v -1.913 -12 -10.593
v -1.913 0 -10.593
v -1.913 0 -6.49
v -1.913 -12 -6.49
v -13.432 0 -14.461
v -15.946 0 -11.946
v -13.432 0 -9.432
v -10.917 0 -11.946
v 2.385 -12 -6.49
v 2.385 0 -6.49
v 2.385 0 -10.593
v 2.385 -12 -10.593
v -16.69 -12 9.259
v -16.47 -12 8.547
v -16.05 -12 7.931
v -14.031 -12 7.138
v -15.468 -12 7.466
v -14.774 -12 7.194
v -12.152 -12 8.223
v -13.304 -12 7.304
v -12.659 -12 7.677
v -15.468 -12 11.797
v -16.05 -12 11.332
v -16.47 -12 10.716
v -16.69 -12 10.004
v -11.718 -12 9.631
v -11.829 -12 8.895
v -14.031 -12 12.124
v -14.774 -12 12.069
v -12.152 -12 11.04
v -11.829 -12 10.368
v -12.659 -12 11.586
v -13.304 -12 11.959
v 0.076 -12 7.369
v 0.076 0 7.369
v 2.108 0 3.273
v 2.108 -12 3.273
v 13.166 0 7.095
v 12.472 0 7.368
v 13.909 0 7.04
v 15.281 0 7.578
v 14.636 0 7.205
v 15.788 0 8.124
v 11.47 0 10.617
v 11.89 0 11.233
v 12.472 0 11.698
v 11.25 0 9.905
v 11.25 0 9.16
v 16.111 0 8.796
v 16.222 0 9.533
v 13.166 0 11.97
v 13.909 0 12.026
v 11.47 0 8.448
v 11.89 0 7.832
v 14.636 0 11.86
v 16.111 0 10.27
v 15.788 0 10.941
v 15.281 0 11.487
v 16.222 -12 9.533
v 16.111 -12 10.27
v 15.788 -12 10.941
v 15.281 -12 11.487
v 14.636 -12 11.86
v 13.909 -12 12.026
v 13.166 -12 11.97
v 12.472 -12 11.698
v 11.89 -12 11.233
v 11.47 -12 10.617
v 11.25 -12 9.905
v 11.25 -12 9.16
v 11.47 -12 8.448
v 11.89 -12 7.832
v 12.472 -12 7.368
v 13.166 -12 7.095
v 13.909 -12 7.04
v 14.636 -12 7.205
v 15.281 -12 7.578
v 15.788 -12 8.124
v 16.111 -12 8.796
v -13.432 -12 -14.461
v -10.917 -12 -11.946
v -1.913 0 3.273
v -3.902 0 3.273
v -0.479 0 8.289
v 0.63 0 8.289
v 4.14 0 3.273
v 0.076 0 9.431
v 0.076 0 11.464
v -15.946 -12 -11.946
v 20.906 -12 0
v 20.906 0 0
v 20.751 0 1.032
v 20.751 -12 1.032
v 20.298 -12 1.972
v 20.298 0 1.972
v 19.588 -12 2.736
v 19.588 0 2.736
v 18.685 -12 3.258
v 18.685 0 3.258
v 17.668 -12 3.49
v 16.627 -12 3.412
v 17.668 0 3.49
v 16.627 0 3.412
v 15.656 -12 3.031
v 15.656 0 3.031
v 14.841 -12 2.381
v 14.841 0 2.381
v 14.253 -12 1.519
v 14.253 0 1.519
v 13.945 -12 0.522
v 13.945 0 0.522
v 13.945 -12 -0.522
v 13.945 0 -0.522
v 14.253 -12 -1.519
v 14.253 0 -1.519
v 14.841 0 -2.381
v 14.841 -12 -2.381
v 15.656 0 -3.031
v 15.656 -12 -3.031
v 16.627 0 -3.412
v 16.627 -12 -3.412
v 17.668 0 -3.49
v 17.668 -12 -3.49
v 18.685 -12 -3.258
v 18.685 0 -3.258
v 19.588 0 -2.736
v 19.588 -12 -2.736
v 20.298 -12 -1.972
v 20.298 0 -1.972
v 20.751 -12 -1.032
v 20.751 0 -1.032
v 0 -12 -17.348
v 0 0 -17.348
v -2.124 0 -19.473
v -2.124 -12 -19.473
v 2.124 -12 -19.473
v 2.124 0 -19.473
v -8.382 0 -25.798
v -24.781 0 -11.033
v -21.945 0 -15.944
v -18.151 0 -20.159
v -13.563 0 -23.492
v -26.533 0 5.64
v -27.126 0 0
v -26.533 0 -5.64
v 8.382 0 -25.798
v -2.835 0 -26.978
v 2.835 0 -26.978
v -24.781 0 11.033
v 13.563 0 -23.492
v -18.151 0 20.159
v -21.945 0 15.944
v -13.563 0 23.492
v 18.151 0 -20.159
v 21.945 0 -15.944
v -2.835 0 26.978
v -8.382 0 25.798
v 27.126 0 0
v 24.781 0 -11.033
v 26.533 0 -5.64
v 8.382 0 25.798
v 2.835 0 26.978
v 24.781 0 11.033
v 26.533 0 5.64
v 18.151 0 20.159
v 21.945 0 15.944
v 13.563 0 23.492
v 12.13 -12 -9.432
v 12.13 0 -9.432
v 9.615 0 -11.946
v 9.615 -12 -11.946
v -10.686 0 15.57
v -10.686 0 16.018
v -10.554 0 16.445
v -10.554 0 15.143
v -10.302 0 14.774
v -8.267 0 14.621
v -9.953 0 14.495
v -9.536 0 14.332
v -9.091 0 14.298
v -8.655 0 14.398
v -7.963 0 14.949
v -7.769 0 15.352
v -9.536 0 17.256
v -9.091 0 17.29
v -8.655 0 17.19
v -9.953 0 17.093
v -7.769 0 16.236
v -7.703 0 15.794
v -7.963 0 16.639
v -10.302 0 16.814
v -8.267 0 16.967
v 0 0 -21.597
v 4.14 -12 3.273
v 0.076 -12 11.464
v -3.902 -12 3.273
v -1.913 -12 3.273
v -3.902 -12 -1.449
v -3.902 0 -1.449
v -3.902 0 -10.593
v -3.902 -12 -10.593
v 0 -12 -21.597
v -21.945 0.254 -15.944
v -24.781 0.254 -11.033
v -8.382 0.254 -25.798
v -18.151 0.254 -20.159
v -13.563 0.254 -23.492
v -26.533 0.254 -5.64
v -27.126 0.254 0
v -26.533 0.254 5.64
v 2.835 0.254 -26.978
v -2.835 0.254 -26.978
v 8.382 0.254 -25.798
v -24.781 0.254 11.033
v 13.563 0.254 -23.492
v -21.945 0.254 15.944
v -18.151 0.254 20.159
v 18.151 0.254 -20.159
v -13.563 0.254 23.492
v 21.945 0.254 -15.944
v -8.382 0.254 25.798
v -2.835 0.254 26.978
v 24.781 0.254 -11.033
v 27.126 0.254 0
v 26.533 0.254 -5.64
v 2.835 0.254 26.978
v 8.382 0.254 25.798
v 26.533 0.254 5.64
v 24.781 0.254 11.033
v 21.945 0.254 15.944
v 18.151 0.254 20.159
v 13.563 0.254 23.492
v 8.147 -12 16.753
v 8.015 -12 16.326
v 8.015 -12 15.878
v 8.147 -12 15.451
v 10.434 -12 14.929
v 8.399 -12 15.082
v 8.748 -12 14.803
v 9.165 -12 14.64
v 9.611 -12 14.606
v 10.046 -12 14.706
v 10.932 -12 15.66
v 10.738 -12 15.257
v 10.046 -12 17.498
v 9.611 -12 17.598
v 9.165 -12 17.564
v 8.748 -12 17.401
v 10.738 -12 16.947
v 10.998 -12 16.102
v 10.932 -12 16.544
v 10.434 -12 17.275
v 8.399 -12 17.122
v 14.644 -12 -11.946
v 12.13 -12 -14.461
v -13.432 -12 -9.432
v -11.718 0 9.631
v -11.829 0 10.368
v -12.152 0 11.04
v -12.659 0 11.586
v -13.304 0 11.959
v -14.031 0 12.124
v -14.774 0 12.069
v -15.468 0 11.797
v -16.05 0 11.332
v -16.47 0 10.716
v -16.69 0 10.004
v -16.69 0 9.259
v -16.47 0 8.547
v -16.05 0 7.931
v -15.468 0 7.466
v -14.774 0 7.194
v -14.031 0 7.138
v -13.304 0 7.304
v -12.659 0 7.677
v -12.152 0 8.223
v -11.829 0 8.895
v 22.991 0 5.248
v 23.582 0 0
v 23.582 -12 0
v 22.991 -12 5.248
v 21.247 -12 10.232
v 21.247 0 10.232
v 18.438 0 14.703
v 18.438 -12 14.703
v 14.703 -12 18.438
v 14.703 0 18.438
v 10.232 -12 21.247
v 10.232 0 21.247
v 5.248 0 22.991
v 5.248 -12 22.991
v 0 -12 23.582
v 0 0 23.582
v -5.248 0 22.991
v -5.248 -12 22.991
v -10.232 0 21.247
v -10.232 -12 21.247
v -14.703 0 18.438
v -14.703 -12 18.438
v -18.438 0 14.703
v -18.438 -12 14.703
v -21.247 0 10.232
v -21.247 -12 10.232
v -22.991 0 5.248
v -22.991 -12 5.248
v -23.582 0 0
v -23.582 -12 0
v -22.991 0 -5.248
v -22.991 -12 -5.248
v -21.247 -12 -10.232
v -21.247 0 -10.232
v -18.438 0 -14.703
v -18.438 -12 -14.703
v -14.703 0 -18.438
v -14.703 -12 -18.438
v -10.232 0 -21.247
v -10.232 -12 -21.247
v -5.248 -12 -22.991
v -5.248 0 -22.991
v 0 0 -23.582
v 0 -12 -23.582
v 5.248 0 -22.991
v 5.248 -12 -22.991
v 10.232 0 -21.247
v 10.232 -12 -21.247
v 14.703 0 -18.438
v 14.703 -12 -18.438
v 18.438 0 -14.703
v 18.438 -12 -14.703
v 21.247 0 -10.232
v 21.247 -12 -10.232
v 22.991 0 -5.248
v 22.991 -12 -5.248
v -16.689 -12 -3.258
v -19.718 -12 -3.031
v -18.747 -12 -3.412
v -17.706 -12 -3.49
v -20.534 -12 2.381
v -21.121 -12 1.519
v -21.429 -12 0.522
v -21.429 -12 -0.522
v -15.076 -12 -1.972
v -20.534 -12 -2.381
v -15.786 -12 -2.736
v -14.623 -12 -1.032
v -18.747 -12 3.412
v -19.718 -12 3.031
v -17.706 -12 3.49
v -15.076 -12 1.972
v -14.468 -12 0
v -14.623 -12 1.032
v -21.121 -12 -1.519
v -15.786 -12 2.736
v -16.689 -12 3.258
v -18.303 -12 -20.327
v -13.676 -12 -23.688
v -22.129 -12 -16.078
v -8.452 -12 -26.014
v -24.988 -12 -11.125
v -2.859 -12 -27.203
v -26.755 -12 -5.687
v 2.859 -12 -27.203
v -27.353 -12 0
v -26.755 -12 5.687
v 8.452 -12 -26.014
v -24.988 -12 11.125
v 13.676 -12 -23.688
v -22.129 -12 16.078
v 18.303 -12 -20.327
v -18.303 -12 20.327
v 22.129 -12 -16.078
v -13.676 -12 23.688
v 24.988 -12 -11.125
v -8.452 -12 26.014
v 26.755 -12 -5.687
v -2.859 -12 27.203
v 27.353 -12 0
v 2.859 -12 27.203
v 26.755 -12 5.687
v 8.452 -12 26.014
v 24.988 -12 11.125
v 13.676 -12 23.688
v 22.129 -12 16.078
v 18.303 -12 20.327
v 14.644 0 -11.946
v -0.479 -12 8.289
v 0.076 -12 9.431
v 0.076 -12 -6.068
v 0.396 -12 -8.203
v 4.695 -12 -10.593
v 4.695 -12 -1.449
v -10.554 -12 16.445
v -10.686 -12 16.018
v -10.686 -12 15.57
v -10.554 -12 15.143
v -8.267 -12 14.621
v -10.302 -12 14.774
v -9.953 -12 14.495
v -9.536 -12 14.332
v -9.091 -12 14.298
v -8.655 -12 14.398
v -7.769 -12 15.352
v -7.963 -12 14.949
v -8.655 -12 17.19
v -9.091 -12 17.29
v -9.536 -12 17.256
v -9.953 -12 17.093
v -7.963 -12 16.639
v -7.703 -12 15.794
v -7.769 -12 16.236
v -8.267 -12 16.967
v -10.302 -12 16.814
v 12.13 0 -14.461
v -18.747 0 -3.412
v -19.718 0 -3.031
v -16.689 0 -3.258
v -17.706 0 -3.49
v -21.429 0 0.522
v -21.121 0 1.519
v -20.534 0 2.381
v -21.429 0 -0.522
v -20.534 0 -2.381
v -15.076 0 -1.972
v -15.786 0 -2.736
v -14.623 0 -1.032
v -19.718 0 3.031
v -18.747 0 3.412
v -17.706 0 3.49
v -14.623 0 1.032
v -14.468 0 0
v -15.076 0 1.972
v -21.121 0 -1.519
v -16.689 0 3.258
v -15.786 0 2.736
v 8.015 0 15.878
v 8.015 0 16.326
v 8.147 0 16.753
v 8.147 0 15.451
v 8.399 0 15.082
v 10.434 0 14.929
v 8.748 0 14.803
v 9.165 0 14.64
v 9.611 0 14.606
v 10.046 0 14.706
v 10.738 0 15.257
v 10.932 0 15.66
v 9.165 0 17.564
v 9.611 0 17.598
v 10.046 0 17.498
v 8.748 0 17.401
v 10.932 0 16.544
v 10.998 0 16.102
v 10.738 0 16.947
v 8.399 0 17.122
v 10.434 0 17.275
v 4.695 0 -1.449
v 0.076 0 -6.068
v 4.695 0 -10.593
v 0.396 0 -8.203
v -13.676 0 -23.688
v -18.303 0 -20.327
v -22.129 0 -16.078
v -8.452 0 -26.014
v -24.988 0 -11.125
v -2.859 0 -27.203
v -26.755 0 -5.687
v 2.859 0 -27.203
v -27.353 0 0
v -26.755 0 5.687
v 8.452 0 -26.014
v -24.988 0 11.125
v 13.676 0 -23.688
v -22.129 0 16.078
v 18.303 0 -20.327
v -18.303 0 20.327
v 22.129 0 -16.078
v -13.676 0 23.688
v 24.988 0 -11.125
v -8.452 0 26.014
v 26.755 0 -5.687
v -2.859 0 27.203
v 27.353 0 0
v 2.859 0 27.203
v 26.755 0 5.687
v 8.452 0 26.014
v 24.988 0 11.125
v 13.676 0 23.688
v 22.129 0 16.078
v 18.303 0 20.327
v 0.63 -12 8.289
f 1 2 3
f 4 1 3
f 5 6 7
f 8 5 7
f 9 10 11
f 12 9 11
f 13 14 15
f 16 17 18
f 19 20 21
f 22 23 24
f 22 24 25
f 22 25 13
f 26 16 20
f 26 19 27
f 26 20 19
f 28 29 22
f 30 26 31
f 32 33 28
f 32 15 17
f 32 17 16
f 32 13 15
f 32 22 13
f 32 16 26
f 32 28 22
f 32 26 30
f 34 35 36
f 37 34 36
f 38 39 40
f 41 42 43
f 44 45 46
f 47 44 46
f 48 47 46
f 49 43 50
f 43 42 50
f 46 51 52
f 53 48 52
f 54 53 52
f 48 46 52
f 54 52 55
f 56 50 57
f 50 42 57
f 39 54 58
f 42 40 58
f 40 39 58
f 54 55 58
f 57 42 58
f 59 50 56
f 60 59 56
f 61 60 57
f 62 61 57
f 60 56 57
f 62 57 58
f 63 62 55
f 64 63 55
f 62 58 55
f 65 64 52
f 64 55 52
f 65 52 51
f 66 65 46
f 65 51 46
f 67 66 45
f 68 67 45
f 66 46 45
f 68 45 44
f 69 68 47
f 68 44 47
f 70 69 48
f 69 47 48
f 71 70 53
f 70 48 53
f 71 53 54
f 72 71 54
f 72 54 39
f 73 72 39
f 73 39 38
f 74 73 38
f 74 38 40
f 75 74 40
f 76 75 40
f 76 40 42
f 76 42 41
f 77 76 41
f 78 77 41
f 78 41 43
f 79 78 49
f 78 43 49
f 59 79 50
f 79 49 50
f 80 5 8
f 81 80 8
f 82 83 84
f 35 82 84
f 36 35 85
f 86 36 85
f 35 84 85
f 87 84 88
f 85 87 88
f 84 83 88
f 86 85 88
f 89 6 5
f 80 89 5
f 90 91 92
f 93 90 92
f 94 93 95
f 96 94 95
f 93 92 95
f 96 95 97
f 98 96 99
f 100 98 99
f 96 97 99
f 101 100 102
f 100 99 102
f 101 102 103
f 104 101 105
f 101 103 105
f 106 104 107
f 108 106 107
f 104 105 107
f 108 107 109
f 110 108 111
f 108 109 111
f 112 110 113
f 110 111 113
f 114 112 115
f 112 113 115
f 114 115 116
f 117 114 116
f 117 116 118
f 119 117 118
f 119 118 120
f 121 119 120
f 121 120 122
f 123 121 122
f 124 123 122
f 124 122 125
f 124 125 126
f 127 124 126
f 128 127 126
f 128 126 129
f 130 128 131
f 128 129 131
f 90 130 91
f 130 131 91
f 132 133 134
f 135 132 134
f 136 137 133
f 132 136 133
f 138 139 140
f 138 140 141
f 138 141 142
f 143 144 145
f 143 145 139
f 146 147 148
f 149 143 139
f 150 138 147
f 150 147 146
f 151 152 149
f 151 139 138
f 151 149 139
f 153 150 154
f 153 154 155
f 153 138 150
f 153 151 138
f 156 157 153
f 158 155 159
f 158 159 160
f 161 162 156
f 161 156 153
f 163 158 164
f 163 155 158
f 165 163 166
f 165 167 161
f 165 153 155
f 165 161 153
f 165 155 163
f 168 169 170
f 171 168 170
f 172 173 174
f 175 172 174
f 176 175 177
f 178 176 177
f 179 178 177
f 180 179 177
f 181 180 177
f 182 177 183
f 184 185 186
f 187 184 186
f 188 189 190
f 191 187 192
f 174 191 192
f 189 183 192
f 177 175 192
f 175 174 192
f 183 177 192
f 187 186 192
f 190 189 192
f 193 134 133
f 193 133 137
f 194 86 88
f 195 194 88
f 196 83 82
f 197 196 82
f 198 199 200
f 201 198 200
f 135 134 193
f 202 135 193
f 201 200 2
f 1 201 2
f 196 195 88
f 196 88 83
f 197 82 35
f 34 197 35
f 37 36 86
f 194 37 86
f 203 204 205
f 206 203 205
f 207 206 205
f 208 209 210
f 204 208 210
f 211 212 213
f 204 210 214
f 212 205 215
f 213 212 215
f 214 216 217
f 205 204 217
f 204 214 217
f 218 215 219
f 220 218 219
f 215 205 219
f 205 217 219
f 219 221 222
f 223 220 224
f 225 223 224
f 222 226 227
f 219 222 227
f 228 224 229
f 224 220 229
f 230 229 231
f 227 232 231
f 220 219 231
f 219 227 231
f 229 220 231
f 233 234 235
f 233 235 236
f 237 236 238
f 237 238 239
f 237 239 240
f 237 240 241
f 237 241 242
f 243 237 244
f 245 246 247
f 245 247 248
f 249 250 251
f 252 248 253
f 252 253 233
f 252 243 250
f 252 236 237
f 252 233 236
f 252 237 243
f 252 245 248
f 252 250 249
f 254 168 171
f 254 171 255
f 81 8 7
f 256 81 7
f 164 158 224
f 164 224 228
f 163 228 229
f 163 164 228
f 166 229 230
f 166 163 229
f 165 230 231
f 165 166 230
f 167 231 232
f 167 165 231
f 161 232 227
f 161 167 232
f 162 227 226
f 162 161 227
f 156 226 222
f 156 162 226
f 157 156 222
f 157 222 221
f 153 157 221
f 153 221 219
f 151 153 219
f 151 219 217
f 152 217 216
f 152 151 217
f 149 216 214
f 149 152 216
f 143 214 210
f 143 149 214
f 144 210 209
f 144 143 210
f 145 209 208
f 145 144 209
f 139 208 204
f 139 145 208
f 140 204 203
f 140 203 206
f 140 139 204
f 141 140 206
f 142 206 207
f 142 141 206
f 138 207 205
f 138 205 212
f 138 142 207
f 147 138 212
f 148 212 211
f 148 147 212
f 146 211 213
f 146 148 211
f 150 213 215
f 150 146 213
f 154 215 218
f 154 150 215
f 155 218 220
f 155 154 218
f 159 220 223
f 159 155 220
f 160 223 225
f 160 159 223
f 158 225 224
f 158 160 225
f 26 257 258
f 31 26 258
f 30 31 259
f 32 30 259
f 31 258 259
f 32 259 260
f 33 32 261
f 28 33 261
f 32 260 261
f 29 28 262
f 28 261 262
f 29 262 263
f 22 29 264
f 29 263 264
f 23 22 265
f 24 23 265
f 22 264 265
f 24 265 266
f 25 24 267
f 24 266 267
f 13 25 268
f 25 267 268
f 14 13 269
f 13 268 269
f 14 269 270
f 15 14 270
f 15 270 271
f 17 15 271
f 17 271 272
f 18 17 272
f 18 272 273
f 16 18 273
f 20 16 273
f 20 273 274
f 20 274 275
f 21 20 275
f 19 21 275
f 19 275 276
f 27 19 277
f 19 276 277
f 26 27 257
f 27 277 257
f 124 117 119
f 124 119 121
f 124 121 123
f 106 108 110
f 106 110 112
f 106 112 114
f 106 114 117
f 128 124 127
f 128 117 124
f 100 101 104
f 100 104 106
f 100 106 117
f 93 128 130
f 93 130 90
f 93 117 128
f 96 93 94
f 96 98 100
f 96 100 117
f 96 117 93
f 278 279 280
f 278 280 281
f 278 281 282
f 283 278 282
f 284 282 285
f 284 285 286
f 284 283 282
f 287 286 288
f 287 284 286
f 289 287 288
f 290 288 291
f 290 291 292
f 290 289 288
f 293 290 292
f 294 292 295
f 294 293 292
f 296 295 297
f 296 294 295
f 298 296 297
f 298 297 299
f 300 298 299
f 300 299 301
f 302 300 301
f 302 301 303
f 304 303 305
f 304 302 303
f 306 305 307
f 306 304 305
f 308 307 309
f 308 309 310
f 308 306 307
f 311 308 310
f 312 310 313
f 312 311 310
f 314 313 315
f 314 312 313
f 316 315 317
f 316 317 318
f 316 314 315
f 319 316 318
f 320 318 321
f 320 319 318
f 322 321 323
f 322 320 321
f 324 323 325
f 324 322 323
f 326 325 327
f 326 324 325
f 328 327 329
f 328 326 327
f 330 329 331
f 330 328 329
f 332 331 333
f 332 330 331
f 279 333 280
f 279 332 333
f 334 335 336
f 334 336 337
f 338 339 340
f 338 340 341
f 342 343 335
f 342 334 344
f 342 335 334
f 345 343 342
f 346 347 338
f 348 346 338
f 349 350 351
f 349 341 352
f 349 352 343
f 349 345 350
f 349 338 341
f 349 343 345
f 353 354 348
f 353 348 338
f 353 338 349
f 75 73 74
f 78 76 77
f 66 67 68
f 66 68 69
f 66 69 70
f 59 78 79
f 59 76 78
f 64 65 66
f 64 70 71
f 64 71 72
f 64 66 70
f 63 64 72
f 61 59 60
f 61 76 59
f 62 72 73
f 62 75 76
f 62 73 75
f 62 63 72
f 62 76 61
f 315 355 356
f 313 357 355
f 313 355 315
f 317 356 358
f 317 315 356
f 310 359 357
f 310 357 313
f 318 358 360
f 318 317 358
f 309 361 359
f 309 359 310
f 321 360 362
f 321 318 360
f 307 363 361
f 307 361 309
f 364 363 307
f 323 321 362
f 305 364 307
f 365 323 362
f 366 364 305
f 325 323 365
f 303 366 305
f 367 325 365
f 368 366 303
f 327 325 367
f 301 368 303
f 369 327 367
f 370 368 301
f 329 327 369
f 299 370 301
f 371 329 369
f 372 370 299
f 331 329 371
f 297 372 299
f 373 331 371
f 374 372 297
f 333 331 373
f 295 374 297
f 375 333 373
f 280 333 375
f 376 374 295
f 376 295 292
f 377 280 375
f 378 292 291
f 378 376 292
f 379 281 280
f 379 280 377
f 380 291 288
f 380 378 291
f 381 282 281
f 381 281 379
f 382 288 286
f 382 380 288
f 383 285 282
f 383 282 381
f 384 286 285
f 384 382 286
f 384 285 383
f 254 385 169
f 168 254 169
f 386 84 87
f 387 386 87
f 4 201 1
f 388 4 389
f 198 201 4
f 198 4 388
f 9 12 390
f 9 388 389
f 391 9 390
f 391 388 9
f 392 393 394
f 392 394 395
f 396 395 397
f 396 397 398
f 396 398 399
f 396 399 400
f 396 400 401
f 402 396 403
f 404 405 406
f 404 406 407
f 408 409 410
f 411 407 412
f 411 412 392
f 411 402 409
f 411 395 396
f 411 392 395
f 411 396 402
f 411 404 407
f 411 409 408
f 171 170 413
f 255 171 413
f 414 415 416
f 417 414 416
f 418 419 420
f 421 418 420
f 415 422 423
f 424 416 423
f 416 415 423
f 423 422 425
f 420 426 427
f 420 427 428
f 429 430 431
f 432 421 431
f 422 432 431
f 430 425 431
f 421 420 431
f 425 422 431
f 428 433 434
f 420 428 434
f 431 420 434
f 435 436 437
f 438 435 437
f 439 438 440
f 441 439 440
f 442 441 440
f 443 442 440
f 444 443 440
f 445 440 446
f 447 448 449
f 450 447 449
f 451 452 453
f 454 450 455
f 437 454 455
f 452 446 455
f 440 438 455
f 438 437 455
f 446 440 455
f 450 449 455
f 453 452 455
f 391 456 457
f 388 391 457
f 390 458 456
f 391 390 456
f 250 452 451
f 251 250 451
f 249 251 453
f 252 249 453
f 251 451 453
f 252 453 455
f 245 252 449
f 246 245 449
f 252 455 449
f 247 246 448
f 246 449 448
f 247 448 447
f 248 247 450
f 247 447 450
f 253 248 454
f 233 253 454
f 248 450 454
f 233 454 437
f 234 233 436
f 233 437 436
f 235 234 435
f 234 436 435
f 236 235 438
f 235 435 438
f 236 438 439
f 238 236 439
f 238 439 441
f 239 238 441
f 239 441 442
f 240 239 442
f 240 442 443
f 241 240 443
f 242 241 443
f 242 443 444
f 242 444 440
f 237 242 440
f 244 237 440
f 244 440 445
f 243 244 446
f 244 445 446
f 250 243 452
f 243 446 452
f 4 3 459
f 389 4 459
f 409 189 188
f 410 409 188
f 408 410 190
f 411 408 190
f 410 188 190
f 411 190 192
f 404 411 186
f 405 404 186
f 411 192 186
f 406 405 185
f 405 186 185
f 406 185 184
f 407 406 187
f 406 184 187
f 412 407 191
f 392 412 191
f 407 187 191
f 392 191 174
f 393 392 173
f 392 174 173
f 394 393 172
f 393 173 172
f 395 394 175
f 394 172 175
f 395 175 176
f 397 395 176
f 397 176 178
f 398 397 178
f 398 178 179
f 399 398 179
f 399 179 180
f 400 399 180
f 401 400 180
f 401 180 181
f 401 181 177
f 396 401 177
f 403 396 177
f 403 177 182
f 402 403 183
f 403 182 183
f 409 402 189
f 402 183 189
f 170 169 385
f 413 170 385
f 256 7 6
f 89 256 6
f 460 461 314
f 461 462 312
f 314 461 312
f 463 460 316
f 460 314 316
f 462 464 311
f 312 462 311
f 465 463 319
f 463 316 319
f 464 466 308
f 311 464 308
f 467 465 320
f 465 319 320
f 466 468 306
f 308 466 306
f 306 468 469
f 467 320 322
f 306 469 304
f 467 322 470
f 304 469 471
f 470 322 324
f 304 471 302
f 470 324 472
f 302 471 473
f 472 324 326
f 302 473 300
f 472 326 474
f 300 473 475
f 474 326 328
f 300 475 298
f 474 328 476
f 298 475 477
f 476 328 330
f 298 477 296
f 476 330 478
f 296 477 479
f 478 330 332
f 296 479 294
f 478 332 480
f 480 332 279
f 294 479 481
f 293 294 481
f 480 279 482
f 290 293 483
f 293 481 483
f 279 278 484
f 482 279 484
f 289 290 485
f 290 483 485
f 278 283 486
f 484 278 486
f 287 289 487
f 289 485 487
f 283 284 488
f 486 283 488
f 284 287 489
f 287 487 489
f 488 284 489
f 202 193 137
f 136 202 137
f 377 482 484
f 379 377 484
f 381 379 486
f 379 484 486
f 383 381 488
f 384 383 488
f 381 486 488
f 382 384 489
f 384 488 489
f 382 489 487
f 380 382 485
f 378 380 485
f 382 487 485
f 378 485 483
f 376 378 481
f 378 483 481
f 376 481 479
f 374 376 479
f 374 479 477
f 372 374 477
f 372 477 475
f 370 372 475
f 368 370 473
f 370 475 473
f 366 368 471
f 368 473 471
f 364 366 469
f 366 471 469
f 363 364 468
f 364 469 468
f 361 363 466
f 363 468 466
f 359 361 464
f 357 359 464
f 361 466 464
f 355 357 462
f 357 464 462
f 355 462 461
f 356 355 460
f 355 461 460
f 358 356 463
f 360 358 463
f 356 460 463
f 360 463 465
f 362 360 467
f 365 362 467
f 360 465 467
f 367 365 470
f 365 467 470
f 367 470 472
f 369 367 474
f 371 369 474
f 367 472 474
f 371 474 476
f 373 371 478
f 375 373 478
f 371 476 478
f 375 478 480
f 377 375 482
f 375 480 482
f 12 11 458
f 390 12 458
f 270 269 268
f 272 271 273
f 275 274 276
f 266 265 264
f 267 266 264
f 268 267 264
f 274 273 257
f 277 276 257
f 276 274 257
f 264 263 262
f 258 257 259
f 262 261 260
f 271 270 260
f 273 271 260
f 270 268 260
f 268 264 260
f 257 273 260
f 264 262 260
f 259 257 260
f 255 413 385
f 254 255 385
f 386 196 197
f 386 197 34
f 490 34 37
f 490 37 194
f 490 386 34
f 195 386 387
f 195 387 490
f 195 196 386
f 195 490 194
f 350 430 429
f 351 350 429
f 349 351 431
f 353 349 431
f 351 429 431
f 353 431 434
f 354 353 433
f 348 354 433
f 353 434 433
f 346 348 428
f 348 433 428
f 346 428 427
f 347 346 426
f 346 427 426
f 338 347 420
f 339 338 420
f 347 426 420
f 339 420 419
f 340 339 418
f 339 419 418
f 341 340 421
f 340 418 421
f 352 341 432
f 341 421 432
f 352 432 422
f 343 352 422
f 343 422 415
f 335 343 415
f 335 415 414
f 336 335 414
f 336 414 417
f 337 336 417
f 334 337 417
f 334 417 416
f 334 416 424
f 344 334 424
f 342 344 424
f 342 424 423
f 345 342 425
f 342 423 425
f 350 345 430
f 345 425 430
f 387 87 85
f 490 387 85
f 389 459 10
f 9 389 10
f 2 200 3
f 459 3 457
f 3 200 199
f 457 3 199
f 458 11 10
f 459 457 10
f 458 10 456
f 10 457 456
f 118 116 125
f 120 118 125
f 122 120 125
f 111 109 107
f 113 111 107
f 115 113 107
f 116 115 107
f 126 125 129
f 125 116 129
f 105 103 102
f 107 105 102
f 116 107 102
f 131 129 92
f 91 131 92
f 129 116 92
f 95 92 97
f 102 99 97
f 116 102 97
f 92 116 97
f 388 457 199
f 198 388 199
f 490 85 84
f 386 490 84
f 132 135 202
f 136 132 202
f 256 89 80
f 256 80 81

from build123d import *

# Parameters (mm, degrees)
F0_R     = 3.5
F1_DEPTH = 12
F0_R_2   = 1.5
F0_R_3   = 2.5
F0_R_4   = 27.3527253219
F0_R_5   = 23.5824909137
F2_R     = 27.1261109812
F3_DEPTH = 0.254


with BuildPart() as f1:
    # F0 (on Front) → F1 (new body)
    with BuildSketch(Plane.XZ):
        with Locations((17.4061976158, 0)):
            Circle(F0_R)
    extrude(amount=F1_DEPTH)


with BuildPart() as f1b:
    # F0 (on Front) → F1, piece 2 (new body)
    with BuildSketch(Plane.XZ):
        with Locations((9.4984066482, 16.101944412)):
            Circle(F0_R_2)
    extrude(amount=F1_DEPTH)


with BuildPart() as f1c:
    # F0 (on Front) → F1, piece 3 (new body)
    with BuildSketch(Plane.XZ):
        with Locations((-9.2026143736, 15.7940543255)):
            Circle(F0_R_2)
    extrude(amount=F1_DEPTH)


with BuildPart() as f1d:
    # F0 (on Front) → F1, piece 4 (new body)
    with BuildSketch(Plane.XZ):
        with Locations((-14.2177977405, 9.6314383245)):
            Circle(F0_R_3)
    extrude(amount=F1_DEPTH)


with BuildPart() as f1e:
    # F0 (on Front) → F1, piece 5 (new body)
    with BuildSketch(Plane.XZ):
        with Locations((13.7222022595, 9.5326483588)):
            Circle(F0_R_3)
    extrude(amount=F1_DEPTH)


with BuildPart() as f1f:
    # F0 (on Front) → F1, piece 6 (new body)
    with BuildSketch(Plane.XZ):
        Circle(F0_R_4)
        Circle(F0_R_5, mode=Mode.SUBTRACT)
    extrude(amount=F1_DEPTH)


with BuildPart() as f1g:
    # F0 (on Front) → F1, piece 7 (new body)
    with BuildSketch(Plane.XZ):
        with Locations((-17.9678955535, 0)):
            Circle(F0_R)
    extrude(amount=F1_DEPTH)


with BuildPart() as f1h:
    # F0 (on Front) → F1, piece 8 (new body)
    with BuildSketch(Plane.XZ):
        Polygon((0.0756857552, -6.0683971426), (-3.9020974945, -1.4490404322), (-3.9020974945, -10.5930404322), (-1.9132058697, -10.5930404322), (-1.9132058697, -6.4903854548), (0.3964724856, -8.2030437937), (2.3853641104, -6.4903854548), (2.3853641104, -10.5930404322), (4.6950424656, -10.5930404322), (4.6950424656, -1.4490404322), align=None)
    extrude(amount=F1_DEPTH)


with BuildPart() as f1i:
    # F0 (on Front) → F1, piece 9 (new body)
    with BuildSketch(Plane.XZ):
        Polygon((12.1296229255, -9.431693289), (9.6151512116, -11.9461650029), (12.1296229255, -14.4606367168), (14.6440946394, -11.9461650029), align=None)
    extrude(amount=F1_DEPTH)


with BuildPart() as f1j:
    # F0 (on Front) → F1, piece 10 (new body)
    with BuildSketch(Plane.XZ):
        Polygon((2.1242466944, -19.4725436347), (0, -17.3482969403), (-2.1242466944, -19.4725436347), (0, -21.596790329), align=None)
    extrude(amount=F1_DEPTH)


with BuildPart() as f1k:
    # F0 (on Front) → F1, piece 11 (new body)
    with BuildSketch(Plane.XZ):
        Polygon((-10.9172082609, -11.9461650029), (-13.4316799748, -9.431693289), (-15.9461516887, -11.9461650029), (-13.4316799748, -14.4606367168), align=None)
    extrude(amount=F1_DEPTH)


with BuildPart() as f1l:
    # F0 (on Front) → F1, piece 12 (new body)
    with BuildSketch(Plane.XZ):
        Polygon((4.1396857552, 3.2729429626), (0.0756857552, 11.4641968348), (-3.9020974945, 3.2729429626), (-1.9132058697, 3.2729429626), (0.0756857552, 7.3685698987), (2.1076857552, 3.2729429626), align=None)
        Polygon((-0.4790890904, 8.2890743717), (0.0756857552, 9.4314949907), (0.6304606008, 8.2890743717), align=None, mode=Mode.SUBTRACT)
    extrude(amount=F1_DEPTH)


with BuildPart() as f3:
    # F2 (on Front) → F3 (new body)
    with BuildSketch(Plane.XZ):
        Circle(F2_R)
    extrude(amount=-F3_DEPTH)


solid = Compound([f1.part, f1b.part, f1c.part, f1d.part, f1e.part, f1f.part, f1g.part, f1h.part, f1i.part, f1j.part, f1k.part, f1l.part, f3.part])
